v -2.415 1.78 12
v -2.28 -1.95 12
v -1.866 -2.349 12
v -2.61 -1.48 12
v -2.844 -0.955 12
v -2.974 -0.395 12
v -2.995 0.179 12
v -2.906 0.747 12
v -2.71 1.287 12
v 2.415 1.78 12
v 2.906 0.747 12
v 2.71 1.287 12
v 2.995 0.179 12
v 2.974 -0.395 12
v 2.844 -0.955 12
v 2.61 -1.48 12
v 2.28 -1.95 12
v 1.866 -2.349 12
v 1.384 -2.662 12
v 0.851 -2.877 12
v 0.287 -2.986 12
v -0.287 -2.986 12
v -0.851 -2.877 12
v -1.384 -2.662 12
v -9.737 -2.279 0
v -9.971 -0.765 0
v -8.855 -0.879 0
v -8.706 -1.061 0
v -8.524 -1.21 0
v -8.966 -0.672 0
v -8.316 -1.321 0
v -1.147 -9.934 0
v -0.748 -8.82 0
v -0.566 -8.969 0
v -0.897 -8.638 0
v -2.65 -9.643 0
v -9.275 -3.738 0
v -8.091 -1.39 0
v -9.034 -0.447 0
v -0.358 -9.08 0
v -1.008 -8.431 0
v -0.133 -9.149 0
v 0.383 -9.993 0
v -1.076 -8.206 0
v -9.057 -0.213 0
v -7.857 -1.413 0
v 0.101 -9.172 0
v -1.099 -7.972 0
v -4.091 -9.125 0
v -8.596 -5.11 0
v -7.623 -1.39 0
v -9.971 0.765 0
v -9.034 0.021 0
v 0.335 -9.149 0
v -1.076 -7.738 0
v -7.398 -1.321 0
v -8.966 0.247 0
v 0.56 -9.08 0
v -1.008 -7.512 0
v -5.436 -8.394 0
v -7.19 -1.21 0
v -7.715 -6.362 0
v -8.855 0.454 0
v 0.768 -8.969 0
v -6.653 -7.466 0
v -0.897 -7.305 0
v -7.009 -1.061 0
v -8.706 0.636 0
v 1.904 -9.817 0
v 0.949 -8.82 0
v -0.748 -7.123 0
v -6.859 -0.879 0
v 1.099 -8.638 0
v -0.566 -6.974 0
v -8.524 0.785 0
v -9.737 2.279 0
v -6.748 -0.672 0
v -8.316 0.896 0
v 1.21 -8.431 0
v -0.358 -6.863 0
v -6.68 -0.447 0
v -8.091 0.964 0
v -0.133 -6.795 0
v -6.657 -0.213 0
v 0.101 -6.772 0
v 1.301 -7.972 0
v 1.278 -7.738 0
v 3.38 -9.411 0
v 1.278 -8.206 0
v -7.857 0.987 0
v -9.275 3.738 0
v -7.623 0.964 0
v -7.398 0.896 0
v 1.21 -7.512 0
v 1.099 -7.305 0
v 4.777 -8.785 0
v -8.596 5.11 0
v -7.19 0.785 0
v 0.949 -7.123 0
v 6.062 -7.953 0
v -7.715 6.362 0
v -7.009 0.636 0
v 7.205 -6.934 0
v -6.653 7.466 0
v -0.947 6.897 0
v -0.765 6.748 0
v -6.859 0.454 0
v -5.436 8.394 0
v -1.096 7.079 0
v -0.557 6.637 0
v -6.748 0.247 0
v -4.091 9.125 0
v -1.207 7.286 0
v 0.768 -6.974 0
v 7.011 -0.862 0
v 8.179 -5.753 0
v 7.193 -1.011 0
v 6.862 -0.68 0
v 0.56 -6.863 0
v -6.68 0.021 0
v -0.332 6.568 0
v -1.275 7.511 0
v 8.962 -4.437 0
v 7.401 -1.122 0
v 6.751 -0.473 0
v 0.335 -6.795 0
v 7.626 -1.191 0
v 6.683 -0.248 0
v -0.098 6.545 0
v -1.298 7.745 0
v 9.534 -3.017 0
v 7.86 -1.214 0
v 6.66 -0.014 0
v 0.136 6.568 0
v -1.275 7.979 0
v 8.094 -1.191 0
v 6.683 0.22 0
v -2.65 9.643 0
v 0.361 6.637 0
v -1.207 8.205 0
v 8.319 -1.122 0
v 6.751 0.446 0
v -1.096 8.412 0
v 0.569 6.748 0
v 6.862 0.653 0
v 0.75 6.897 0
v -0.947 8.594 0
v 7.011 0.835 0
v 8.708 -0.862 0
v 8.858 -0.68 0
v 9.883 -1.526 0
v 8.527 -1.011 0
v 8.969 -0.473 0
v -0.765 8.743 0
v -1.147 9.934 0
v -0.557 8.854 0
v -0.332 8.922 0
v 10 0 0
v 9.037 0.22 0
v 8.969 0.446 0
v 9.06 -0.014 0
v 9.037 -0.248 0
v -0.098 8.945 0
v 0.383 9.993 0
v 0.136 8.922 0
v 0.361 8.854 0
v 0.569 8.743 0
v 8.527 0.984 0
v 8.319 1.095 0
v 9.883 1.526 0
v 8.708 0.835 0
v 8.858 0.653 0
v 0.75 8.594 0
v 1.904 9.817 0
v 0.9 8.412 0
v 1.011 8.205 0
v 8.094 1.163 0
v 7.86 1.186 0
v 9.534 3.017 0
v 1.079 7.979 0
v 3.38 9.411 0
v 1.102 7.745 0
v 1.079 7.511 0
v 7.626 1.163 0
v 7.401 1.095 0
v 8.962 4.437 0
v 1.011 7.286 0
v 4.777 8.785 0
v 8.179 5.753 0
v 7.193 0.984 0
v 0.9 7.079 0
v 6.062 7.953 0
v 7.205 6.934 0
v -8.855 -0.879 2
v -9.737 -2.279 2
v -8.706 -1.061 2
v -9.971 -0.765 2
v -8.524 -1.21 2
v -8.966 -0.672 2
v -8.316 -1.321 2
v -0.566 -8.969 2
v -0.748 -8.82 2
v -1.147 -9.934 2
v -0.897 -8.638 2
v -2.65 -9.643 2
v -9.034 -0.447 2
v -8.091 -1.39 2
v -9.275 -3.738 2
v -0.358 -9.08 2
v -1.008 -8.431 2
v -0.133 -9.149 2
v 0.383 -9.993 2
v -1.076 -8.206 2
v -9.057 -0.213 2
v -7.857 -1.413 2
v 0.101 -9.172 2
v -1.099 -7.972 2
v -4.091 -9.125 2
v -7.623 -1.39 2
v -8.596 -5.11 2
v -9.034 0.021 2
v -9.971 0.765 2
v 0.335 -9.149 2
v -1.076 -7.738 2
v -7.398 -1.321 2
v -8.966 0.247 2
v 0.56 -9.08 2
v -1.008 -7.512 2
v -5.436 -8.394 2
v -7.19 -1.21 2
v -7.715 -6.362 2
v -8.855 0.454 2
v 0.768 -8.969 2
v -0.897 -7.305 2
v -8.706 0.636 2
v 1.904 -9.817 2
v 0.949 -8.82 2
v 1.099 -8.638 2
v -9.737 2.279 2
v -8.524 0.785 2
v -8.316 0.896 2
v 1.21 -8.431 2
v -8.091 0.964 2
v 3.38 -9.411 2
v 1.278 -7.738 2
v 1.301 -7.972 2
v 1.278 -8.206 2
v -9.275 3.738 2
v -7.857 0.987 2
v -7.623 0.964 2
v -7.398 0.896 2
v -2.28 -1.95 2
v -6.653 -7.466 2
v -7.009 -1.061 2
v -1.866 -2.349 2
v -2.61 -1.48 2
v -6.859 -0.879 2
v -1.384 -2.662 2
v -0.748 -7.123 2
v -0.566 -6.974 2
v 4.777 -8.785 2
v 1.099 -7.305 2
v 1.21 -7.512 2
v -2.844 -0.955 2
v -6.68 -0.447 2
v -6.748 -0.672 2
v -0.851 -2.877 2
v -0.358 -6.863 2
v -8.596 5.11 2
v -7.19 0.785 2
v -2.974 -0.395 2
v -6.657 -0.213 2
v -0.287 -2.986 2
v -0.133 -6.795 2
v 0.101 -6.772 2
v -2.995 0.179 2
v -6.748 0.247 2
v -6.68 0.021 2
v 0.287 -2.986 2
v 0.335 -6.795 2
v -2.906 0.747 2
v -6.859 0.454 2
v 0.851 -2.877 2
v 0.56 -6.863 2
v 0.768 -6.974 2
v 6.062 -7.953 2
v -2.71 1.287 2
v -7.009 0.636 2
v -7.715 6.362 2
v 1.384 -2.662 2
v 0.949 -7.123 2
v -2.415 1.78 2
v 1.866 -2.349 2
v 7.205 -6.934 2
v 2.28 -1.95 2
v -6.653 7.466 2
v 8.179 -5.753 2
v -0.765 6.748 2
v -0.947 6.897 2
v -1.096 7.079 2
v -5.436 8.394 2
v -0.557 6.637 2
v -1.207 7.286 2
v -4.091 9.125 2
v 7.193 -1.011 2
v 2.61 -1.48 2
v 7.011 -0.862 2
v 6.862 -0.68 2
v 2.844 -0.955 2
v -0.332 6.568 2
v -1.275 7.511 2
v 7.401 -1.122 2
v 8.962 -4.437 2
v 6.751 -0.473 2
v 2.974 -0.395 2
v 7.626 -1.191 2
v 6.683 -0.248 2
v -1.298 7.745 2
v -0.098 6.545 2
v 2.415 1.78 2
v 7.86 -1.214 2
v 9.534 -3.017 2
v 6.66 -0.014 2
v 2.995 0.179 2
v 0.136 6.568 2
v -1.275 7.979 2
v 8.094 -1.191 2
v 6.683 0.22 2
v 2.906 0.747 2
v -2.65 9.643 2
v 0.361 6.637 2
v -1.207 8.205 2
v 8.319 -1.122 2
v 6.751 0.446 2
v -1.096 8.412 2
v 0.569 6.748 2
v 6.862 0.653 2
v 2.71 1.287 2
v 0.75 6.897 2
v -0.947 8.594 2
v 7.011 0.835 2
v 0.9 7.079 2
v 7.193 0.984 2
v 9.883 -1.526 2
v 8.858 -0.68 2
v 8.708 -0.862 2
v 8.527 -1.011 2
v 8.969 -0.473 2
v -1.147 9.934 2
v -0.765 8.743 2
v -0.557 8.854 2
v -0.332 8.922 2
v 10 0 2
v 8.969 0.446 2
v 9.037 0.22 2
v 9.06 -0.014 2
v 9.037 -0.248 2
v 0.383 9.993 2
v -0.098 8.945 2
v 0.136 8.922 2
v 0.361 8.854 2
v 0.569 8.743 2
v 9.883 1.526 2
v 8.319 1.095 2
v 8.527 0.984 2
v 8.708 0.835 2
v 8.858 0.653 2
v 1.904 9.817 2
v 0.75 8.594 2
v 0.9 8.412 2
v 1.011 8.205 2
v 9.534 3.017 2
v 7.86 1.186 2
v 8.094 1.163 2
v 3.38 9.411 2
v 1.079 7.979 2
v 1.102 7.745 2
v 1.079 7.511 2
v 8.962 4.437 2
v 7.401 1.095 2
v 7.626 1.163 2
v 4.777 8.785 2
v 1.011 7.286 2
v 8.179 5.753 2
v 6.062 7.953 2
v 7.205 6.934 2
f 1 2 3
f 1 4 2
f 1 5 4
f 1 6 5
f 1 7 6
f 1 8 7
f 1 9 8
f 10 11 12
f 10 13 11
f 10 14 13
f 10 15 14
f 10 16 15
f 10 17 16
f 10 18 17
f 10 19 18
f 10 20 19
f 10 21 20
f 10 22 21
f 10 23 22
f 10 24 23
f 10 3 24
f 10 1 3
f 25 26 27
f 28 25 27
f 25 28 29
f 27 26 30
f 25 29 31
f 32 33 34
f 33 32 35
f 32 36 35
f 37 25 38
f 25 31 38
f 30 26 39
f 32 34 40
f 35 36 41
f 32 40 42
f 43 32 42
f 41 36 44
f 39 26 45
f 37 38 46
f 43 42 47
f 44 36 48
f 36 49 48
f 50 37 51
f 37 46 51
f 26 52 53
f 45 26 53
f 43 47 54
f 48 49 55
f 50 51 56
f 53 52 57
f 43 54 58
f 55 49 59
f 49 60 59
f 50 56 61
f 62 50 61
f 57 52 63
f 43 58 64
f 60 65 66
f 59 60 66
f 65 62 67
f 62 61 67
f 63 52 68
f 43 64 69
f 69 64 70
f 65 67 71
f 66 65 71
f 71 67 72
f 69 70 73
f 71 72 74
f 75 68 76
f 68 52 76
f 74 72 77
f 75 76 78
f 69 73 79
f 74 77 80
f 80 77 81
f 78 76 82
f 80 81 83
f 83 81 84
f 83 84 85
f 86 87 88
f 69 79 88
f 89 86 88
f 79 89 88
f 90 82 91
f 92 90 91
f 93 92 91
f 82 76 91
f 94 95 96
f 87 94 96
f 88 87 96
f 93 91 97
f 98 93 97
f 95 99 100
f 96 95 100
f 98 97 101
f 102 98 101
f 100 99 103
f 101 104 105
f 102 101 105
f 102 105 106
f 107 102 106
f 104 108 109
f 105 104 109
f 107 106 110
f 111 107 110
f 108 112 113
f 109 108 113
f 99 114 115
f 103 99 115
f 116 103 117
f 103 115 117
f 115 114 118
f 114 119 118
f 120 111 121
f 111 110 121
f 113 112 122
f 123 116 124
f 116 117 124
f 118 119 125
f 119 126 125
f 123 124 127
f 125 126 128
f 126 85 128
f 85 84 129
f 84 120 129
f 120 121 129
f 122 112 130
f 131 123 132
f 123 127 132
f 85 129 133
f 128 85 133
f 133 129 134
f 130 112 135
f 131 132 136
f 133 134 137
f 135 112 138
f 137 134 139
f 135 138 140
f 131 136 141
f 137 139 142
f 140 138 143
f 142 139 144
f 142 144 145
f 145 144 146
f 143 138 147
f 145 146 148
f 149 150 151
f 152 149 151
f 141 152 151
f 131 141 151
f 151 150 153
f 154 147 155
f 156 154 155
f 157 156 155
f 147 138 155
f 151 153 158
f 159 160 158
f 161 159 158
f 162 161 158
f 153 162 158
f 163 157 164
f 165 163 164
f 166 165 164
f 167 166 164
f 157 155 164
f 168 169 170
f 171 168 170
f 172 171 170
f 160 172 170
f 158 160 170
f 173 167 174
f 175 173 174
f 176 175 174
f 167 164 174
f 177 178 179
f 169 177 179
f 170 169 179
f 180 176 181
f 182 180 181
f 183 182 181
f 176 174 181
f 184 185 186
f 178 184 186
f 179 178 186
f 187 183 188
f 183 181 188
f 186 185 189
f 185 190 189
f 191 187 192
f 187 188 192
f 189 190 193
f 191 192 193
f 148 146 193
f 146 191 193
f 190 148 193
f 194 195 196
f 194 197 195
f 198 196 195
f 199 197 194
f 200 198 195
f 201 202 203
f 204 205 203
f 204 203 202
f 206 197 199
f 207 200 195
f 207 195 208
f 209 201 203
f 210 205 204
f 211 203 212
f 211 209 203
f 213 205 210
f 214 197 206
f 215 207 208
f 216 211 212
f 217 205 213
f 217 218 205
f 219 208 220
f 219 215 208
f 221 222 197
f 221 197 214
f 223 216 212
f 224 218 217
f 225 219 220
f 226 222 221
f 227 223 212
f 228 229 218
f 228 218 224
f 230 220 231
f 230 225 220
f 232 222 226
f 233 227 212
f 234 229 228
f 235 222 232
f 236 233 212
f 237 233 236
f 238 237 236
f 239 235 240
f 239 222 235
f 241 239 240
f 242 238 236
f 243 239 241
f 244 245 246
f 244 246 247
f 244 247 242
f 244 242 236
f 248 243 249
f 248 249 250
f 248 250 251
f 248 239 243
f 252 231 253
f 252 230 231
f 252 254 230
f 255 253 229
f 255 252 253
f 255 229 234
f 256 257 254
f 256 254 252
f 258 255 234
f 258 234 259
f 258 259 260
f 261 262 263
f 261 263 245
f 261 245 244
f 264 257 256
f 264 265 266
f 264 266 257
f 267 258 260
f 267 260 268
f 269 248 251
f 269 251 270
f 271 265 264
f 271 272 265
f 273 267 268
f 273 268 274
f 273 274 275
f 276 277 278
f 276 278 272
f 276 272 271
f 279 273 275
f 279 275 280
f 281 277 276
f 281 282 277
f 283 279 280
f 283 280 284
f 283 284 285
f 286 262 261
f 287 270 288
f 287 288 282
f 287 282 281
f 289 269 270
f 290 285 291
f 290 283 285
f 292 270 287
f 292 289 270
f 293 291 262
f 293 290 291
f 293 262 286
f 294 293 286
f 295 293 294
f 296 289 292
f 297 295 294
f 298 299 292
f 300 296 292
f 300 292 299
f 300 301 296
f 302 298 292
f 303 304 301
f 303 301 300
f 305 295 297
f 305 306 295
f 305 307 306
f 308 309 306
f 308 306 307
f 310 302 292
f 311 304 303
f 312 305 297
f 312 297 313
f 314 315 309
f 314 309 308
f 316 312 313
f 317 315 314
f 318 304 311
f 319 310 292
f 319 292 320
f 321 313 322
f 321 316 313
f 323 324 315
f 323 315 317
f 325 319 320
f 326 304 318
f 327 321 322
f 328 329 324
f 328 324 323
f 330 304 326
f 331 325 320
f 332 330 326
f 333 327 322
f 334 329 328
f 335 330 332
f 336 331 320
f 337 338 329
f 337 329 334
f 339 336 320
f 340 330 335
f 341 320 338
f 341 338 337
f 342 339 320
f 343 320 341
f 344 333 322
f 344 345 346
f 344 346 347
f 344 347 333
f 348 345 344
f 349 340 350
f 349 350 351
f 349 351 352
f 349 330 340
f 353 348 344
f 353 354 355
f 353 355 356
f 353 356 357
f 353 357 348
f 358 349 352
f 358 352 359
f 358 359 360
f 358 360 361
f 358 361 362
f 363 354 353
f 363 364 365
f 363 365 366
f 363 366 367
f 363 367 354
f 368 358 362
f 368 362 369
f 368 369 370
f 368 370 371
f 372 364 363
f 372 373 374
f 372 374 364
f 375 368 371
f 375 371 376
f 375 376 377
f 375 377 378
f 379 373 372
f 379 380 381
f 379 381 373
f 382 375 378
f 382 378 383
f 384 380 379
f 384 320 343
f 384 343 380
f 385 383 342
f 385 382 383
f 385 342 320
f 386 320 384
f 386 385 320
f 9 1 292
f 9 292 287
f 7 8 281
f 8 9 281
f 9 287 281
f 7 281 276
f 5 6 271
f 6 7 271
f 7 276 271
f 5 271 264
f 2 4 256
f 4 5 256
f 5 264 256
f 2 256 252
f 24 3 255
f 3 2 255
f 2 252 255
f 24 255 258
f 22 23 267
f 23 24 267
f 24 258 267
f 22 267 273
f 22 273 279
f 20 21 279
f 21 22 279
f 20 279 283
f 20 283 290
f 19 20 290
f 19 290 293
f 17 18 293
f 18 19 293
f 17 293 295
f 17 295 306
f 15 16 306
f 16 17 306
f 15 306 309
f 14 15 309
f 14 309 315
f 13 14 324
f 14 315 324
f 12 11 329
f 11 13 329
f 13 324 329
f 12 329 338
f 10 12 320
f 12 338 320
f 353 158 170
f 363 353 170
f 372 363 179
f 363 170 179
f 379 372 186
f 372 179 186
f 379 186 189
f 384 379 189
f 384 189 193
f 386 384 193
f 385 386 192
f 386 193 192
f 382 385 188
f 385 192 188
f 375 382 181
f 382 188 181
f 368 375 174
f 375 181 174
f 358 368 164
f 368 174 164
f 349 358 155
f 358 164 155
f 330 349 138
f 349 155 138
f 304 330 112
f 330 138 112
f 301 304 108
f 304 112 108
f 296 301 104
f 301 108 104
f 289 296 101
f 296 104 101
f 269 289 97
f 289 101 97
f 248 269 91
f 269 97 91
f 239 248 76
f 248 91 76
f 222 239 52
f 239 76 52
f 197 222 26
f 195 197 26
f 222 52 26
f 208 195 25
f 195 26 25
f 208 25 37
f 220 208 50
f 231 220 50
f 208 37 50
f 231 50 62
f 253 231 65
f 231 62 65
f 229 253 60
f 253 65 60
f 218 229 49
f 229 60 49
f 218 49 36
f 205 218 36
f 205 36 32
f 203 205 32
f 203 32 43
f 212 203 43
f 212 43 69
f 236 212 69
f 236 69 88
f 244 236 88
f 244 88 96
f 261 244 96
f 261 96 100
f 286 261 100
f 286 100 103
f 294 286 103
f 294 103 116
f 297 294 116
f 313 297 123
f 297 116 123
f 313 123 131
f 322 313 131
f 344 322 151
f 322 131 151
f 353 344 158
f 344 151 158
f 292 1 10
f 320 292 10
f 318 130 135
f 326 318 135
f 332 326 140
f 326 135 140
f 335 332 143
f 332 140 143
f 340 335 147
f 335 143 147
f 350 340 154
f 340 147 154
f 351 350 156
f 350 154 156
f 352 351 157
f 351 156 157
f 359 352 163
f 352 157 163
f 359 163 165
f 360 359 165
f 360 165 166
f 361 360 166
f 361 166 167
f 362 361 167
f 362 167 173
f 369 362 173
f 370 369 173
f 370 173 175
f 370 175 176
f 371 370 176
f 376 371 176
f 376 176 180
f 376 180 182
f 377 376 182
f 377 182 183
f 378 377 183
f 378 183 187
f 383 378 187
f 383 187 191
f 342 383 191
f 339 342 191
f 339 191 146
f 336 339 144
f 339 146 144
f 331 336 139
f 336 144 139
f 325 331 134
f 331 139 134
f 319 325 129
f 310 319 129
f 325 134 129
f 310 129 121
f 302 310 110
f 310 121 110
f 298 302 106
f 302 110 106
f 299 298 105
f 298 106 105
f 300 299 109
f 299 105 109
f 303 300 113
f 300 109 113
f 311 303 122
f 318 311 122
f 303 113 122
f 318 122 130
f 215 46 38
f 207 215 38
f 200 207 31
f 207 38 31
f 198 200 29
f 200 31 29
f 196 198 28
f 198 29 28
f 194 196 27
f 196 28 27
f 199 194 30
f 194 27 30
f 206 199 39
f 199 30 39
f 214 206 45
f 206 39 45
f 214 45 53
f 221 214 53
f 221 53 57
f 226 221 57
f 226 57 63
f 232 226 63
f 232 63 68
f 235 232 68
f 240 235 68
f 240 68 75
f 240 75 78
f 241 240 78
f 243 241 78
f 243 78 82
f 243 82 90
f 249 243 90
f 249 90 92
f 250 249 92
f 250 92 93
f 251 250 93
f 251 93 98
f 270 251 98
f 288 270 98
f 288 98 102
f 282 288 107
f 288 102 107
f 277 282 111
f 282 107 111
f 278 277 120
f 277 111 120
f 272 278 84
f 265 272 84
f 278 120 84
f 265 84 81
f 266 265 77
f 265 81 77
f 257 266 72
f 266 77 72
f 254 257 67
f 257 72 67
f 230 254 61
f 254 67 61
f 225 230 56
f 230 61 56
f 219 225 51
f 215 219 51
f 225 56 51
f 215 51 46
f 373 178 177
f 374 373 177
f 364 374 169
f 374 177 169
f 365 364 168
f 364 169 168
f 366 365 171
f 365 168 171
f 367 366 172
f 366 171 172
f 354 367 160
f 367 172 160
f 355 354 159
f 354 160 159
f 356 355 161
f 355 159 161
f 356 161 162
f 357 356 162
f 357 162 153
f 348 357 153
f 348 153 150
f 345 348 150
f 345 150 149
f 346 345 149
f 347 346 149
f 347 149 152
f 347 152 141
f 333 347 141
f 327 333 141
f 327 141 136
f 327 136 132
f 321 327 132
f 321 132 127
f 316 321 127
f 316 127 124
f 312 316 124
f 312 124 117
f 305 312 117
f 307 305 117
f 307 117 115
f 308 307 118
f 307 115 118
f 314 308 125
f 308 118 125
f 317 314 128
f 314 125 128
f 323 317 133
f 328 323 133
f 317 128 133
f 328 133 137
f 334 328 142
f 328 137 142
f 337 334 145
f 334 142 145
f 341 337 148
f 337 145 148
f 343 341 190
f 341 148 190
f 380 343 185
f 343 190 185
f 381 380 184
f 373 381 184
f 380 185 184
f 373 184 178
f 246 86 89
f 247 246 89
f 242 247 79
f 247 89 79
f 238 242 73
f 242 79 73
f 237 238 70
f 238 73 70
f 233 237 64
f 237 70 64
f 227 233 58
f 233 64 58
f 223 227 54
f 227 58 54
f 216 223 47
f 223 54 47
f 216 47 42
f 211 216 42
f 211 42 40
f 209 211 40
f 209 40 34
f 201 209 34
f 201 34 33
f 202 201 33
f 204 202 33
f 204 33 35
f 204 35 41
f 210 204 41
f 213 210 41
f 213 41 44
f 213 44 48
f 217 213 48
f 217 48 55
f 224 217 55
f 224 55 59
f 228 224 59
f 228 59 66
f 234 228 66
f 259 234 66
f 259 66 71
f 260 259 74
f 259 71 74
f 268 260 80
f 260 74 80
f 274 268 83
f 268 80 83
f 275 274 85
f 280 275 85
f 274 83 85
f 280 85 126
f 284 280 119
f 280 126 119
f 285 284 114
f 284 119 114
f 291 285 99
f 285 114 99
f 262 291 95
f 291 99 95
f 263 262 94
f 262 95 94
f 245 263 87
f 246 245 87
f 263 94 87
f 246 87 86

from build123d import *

# Parameters (mm, degrees)
ESQUISSE1_R                  = 10
BOSS_EXTRU_1_DEPTH           = 2
D_GAGEMENT_M21_D             = 2.4
R_P_TITION_CIRCULAIRE1_COUNT = 4
ESQUISSE4_R                  = 3
BOSS_EXTRU_2_DEPTH           = 10
ESQUISSE5_W                  = 6
ESQUISSE5_H                  = 1.22
ENL_V_MAT_EXTRU_1_DEPTH      = 10


with BuildPart() as part:
    # Esquisse1 → Boss.-Extru.1 (new body)
    with BuildSketch(Plane.XY):
        Circle(ESQUISSE1_R)
    extrude(amount=BOSS_EXTRU_1_DEPTH)

    # Dégagement M21 (through all)
    with Locations(Plane(origin=(-0.098042357, 7.745346196, 2), x_dir=(1, 0, 0), z_dir=(0, 0, 1))):
        with Locations((0, 0)):
            d_gagement_m21 = Hole(D_GAGEMENT_M21_D / 2)

    # Répétition circulaire1: Dégagement M21 ×4 about axis
    r_p_tition_circulaire1_axis = Axis((0.001432437, -0.113162526, 0), (0, 0, 1))
    for i in range(1, R_P_TITION_CIRCULAIRE1_COUNT):
        add(d_gagement_m21.rotate(r_p_tition_circulaire1_axis, i * 360 / R_P_TITION_CIRCULAIRE1_COUNT), mode=Mode.SUBTRACT)

    # Esquisse4 → Boss.-Extru.2 (add)
    with BuildSketch(Plane.XY.offset(2)):
        Circle(ESQUISSE4_R)
    extrude(amount=BOSS_EXTRU_2_DEPTH)

    # Esquisse5 → Enlèv. mat.-Extru.1 (cut)
    with BuildSketch(Plane.XY.offset(12)):
        with Locations((0, 2.39)):
            Rectangle(ESQUISSE5_W, ESQUISSE5_H)
    extrude(amount=-ENL_V_MAT_EXTRU_1_DEPTH, mode=Mode.SUBTRACT)


solid = part.part
